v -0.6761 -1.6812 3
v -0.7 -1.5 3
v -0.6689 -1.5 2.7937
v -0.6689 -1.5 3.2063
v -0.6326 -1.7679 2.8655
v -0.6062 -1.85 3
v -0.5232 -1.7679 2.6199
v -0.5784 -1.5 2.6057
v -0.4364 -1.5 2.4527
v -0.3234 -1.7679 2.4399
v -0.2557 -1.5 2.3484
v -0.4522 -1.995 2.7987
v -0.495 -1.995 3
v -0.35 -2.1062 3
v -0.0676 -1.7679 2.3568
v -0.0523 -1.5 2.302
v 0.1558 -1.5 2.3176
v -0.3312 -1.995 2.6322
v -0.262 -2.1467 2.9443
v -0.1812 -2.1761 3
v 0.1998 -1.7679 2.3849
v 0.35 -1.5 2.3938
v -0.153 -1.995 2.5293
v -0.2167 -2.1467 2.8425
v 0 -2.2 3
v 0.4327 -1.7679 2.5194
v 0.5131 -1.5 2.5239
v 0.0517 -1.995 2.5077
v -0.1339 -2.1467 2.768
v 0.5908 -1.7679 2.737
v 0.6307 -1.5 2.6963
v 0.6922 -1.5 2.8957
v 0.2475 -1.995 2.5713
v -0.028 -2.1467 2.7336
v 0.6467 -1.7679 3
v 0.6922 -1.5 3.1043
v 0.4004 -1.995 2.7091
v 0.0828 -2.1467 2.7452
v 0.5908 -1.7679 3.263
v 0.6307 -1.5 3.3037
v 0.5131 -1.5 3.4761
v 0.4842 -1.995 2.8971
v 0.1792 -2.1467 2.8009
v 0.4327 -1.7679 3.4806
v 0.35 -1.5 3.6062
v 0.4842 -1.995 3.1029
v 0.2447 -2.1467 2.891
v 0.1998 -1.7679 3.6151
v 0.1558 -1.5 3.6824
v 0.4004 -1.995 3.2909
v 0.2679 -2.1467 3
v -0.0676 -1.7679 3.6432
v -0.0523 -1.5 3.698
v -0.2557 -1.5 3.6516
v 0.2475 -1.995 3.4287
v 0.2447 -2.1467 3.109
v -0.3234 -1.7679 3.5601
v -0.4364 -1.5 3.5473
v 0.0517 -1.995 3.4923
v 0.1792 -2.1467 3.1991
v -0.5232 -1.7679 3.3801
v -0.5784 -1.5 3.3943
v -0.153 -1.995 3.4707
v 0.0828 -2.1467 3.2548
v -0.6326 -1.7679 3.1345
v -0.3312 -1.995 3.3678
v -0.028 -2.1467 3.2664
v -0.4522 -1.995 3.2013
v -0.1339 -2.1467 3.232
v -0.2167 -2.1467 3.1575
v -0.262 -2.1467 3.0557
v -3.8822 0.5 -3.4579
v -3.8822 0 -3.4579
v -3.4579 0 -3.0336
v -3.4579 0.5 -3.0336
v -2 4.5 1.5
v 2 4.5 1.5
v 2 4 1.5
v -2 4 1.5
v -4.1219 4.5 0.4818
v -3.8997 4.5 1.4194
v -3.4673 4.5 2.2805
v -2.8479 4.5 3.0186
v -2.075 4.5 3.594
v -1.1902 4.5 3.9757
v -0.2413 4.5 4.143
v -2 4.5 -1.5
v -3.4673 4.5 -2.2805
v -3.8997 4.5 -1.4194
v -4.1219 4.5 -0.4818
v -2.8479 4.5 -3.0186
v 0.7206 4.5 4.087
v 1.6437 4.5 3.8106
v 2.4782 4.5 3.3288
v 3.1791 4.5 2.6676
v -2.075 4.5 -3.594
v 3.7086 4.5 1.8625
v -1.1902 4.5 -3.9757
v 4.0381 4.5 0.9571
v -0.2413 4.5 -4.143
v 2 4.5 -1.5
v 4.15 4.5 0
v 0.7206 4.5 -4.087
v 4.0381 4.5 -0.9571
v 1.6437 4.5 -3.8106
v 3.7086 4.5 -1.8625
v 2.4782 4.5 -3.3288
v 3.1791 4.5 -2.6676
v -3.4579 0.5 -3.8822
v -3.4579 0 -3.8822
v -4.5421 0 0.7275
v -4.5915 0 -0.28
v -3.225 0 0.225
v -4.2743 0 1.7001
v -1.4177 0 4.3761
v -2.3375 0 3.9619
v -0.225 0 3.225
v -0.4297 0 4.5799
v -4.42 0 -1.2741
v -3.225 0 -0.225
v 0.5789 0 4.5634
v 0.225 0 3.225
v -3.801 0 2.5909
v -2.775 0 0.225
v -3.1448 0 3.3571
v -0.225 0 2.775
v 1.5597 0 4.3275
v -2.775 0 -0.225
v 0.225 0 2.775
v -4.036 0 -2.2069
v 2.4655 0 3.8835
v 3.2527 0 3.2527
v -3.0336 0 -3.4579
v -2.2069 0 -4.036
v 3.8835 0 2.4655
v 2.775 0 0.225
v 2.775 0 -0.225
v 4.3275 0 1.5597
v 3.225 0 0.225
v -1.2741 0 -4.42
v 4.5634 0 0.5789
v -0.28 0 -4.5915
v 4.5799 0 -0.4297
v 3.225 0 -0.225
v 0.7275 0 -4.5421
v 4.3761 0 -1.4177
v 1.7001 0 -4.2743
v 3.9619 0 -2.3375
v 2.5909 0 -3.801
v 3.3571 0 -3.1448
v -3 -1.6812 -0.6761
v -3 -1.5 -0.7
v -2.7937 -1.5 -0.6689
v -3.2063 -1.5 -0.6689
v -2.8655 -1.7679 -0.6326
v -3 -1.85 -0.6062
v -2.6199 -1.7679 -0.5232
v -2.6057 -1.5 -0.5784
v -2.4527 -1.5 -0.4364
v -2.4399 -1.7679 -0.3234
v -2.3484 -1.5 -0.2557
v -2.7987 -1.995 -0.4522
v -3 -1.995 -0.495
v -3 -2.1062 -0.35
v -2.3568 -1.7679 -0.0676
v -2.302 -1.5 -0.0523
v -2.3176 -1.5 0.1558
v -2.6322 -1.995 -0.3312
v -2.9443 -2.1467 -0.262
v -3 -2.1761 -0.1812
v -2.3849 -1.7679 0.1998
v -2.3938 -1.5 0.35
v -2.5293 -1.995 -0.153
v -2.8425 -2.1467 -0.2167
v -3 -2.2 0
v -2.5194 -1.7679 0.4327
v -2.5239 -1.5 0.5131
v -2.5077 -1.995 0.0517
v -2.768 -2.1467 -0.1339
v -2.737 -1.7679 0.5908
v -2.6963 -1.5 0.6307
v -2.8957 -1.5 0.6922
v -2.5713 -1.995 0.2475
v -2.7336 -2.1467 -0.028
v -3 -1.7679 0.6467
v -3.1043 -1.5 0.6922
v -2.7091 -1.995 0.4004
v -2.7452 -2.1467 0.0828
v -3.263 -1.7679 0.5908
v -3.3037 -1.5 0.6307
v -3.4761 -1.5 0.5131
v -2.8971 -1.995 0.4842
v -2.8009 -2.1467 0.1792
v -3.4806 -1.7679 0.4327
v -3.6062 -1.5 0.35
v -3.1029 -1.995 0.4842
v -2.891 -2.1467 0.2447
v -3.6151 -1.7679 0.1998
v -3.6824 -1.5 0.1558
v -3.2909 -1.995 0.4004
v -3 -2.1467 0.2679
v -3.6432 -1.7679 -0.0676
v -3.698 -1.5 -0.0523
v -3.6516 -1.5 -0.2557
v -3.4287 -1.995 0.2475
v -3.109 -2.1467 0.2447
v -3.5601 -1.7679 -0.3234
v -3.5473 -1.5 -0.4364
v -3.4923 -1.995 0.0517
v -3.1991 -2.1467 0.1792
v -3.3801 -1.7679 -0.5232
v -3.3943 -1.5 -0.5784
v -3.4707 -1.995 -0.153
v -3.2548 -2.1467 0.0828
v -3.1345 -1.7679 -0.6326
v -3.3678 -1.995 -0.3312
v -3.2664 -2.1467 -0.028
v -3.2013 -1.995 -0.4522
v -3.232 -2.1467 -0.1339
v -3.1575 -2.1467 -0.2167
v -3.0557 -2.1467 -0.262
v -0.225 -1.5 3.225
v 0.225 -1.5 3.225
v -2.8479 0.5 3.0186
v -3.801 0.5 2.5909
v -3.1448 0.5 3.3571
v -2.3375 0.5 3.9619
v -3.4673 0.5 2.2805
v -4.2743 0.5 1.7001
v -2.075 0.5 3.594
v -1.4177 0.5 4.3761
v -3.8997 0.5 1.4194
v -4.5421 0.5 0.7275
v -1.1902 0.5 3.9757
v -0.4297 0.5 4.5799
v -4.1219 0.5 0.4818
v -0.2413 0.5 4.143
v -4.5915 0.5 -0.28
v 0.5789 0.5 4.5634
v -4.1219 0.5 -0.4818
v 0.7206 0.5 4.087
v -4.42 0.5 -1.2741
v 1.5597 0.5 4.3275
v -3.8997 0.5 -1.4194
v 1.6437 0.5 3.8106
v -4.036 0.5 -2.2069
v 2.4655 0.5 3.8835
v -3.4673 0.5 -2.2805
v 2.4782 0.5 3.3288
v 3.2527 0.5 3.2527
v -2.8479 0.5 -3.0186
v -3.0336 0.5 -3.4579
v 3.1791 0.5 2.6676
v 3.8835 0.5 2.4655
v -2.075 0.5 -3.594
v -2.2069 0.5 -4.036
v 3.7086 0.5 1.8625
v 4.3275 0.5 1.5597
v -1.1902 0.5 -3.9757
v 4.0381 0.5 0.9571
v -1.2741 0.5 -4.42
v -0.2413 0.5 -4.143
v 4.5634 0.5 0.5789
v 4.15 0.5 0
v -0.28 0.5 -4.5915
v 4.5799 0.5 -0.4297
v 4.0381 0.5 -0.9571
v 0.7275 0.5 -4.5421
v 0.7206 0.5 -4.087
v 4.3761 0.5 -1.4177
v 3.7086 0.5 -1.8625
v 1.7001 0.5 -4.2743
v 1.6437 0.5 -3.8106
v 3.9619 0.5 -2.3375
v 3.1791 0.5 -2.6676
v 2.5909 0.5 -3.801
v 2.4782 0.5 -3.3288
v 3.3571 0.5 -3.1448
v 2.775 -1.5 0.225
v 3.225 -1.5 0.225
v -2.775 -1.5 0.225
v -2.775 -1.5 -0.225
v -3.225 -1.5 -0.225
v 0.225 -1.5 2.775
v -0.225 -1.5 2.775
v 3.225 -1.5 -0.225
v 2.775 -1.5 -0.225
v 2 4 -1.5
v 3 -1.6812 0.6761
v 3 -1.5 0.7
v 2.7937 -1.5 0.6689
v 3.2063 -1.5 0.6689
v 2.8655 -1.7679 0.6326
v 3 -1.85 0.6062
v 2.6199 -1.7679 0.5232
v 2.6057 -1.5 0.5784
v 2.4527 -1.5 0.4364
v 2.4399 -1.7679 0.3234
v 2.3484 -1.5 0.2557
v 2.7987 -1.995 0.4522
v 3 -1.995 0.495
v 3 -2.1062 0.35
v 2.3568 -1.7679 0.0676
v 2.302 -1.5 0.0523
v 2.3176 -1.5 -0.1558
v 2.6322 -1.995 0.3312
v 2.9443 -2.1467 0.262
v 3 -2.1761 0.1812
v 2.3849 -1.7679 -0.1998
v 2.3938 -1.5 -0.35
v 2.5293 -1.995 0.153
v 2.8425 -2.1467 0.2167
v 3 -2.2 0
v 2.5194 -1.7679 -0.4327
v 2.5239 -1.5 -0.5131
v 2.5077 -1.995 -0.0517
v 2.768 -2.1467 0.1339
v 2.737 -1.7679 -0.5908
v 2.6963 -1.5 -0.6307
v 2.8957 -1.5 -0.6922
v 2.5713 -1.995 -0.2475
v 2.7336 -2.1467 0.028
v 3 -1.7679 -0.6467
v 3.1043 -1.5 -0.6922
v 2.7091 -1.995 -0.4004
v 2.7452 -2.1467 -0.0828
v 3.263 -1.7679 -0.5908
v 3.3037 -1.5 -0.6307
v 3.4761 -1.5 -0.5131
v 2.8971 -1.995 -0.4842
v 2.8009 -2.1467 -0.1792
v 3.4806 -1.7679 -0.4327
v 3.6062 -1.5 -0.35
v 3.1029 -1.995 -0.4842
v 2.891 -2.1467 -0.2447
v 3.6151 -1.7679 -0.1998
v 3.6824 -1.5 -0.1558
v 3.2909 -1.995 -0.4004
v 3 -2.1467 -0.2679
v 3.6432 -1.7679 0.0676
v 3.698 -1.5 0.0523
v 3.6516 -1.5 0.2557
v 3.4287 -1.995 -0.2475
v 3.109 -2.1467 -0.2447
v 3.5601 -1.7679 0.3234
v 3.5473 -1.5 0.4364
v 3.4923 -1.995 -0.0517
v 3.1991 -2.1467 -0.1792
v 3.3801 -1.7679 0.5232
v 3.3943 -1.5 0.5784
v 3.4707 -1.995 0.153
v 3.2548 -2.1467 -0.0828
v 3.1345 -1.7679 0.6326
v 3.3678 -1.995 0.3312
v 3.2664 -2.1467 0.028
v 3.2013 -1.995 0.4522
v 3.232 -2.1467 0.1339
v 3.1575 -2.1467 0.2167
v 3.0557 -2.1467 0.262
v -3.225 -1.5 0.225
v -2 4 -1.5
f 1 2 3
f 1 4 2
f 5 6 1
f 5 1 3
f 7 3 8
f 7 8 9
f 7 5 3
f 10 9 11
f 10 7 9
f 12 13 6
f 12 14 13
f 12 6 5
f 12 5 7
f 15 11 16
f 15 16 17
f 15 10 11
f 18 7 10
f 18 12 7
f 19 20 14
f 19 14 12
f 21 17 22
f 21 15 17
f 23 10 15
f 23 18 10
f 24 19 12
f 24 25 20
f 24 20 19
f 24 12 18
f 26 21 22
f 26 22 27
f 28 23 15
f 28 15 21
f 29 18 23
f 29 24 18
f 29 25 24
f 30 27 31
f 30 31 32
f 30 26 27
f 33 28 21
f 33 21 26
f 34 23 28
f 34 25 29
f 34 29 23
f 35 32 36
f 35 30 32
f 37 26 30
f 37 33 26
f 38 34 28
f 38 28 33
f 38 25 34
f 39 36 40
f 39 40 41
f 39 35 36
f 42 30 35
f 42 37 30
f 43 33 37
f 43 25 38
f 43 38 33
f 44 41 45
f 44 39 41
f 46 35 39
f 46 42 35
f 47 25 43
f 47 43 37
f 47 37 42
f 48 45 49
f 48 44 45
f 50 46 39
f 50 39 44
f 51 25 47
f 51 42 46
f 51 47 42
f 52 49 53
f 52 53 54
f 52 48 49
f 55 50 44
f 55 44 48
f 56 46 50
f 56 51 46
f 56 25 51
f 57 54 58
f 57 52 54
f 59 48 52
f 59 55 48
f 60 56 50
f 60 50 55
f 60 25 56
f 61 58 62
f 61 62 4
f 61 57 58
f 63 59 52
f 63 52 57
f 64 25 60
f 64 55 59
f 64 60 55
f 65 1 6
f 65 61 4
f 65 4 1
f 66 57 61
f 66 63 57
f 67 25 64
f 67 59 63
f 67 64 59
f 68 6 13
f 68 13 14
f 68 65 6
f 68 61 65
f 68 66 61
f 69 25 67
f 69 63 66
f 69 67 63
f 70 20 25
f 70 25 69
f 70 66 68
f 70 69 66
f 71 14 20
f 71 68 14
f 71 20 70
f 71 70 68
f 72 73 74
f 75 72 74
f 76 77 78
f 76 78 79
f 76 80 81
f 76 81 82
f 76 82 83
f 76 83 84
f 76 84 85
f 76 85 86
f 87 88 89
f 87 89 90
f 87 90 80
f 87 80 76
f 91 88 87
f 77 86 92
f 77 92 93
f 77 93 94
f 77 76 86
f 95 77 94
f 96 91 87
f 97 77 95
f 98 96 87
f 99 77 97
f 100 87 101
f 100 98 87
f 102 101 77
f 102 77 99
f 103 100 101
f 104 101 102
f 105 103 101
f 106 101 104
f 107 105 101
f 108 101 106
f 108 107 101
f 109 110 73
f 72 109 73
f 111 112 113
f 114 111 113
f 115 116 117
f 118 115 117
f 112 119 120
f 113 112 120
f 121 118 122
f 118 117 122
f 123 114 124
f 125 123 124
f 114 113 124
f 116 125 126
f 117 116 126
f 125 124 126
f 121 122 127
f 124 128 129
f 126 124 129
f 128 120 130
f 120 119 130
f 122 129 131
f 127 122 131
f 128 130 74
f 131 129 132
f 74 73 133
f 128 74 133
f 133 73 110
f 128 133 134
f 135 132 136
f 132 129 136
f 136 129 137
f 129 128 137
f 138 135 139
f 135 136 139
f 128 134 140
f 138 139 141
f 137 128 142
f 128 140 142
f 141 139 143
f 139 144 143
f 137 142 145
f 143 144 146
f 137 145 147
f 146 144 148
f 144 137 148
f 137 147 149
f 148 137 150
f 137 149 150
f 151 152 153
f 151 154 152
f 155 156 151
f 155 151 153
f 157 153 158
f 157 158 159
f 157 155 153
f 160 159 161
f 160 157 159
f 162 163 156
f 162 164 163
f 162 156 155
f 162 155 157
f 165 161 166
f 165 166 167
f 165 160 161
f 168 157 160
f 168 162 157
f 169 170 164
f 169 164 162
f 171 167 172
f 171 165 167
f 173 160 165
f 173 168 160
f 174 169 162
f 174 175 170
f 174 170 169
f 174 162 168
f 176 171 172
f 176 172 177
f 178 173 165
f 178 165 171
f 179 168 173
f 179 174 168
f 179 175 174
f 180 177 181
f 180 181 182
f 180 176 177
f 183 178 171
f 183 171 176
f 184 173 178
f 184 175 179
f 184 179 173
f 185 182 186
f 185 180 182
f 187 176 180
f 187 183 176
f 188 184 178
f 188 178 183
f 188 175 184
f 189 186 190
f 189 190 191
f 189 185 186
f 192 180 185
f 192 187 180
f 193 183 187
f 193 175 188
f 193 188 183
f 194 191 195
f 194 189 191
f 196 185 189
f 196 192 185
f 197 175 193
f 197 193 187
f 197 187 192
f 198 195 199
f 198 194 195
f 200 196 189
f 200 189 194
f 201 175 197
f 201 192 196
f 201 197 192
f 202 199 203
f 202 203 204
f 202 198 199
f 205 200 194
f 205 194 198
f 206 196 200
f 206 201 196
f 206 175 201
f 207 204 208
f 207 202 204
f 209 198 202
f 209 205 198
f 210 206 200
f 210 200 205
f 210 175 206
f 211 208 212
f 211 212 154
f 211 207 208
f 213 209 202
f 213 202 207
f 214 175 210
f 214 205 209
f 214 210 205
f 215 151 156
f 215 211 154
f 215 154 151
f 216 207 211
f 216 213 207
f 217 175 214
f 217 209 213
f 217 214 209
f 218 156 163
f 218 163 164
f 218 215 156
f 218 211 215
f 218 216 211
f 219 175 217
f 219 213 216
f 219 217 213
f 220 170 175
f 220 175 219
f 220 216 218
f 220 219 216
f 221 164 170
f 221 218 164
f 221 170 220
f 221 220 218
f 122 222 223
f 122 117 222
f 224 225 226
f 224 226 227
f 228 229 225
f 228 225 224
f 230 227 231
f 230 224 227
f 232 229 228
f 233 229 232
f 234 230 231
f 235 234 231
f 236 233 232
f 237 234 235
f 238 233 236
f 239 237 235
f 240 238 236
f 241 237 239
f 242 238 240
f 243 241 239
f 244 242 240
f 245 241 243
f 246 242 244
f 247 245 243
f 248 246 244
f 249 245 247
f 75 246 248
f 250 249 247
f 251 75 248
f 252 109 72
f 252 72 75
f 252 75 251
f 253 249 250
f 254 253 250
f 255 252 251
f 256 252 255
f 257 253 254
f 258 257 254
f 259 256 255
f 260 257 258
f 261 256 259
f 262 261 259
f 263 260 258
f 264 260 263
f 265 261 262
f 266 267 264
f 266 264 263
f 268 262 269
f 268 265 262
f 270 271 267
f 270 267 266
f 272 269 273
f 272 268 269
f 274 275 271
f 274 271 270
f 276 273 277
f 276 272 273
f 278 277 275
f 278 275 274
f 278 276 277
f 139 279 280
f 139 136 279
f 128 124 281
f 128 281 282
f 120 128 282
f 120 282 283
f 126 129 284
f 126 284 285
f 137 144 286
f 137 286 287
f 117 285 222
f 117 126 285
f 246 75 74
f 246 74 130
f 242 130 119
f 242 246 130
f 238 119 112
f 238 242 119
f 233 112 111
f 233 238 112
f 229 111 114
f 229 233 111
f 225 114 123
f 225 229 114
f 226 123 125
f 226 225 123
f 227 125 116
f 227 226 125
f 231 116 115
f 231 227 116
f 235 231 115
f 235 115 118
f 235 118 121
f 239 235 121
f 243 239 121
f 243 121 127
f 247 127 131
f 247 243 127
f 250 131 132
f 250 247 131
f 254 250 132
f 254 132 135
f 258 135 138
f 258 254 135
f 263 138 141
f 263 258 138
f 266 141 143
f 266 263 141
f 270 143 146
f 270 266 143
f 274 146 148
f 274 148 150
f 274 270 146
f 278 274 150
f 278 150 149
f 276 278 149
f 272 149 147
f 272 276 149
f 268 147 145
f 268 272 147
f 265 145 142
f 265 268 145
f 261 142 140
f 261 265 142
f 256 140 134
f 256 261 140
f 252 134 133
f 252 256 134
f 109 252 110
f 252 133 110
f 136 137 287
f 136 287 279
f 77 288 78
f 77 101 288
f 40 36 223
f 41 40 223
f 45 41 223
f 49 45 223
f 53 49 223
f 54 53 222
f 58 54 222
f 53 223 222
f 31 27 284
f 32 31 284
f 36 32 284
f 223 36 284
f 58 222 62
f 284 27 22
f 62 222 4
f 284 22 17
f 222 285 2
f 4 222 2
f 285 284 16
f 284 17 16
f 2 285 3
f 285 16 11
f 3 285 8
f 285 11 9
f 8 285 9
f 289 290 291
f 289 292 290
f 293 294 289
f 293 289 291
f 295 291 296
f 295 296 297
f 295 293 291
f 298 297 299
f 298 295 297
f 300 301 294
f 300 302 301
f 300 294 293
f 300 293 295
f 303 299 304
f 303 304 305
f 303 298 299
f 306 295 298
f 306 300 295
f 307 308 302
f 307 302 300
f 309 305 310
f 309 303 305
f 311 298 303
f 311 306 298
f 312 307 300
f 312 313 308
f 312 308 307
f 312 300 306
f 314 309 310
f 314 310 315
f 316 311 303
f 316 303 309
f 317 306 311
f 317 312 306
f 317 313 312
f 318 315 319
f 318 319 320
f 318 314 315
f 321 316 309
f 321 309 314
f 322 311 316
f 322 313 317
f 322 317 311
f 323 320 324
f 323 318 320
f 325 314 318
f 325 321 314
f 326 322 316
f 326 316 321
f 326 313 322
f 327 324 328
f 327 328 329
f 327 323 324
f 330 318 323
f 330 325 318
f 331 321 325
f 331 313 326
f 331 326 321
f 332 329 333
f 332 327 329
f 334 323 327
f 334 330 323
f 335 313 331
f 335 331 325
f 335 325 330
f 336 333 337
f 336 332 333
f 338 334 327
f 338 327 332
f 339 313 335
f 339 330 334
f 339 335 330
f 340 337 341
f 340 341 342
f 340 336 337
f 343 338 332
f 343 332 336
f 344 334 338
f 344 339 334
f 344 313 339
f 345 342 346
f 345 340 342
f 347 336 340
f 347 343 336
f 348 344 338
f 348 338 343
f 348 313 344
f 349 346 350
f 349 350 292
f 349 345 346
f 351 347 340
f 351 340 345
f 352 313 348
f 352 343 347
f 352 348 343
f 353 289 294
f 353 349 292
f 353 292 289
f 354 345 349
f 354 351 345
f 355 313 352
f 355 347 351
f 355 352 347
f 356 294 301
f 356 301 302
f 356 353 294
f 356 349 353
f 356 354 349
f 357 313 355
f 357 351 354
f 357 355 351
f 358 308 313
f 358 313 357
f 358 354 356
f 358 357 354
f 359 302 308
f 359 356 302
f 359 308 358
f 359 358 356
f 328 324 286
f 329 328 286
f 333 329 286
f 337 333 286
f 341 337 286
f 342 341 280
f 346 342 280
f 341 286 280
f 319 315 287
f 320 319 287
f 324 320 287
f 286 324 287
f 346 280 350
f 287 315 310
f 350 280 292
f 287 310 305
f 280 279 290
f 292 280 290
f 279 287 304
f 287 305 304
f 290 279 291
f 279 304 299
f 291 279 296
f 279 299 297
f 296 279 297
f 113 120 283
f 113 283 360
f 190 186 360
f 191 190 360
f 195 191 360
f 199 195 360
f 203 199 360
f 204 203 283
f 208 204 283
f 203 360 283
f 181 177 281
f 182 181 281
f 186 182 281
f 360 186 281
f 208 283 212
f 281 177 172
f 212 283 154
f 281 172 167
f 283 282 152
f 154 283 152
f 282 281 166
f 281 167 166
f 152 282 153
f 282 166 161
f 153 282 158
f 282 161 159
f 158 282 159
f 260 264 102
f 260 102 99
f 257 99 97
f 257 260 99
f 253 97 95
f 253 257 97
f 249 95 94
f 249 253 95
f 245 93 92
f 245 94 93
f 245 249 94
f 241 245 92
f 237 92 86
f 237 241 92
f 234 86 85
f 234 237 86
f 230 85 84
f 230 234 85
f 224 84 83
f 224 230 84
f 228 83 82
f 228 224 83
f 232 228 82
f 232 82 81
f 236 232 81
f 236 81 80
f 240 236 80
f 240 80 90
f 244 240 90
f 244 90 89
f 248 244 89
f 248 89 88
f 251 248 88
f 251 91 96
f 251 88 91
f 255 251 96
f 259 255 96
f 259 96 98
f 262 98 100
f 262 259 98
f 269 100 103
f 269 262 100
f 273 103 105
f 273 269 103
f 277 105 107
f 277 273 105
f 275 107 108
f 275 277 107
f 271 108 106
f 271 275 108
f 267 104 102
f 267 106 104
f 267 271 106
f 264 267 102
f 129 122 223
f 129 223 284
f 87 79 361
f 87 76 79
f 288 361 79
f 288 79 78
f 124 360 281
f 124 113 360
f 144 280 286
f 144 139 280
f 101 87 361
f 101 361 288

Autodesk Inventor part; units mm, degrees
ref_plane "YZ Plane" through (0, 0, 0) normal (1, 0, 0) x (0, 1, 0)
ref_plane "XZ Plane" through (0, 0, 0) normal (0, 1, 0) x (-1, 0, 0)
sketch "Sketch1" plane through (0, 0, 0) normal (0, 0, 1) x (1, 0, 0)
  line L0 (0, 4.5) -> (4.15, 4.5)
  line L1 (4.15, 4.5) -> (4.15, 0.5)
  line L2 (4.6, 0) -> (0, 0)
  line L3 (0, 0) -> (0, 4.5)
  line L4 (4.6, 0) -> (4.6, 0.5)
  line L5 (4.6, 0.5) -> (4.15, 0.5)
  dimension "d0" = 4.15
  dimension "d2" = 0.5
  dimension "d3" = 4.6
  dimension "d5" = 4.5
revolve "Revolution1" add sketch "Sketch1" angle 360 about axis through (0, 0, 0) along (0, 1, 0)
sketch "Sketch2" plane through (0, 4.5, 0) normal (0, 1, 0) x (1, 0, 0)
  line L0 (-2, 1.5) -> (2, 1.5)
  line L1 (2, 1.5) -> (2, -1.5)
  line L2 (2, -1.5) -> (-2, -1.5)
  line L3 (-2, -1.5) -> (-2, 1.5)
  line L4 (-2, 1.5) -> (2, -1.5) construction
  line L5 (2, 1.5) -> (-2, -1.5) construction
  point P0 (0, 0)
  dimension "d7" = 4
  dimension "d8" = 3
extrude "Extrusion1" cut sketch "Sketch2" against normal blind 0.5
sketch "Sketch3" plane through (0, 0, 0) normal (0, -1, 0) x (1, 0, 0)
  line L0 (-0.225, 0.225) -> (0.225, 0.225)
  line L1 (0.225, 0.225) -> (0.225, -0.225)
  line L2 (0.225, -0.225) -> (-0.225, -0.225)
  line L3 (-0.225, -0.225) -> (-0.225, 0.225)
  line L4 (-0.225, 0.225) -> (0.225, -0.225) construction
  line L5 (0.225, 0.225) -> (-0.225, -0.225) construction
  line L6 (2.775, 0.225) -> (3.225, 0.225)
  line L7 (3.225, 0.225) -> (3.225, -0.225)
  line L8 (3.225, -0.225) -> (2.775, -0.225)
  line L9 (2.775, -0.225) -> (2.775, 0.225)
  line L10 (2.775, 0.225) -> (3.225, -0.225) construction
  line L11 (3.225, 0.225) -> (2.775, -0.225) construction
  line L12 (-3.225, 0.225) -> (-2.775, 0.225)
  line L13 (-2.775, 0.225) -> (-2.775, -0.225)
  line L14 (-2.775, -0.225) -> (-3.225, -0.225)
  line L15 (-3.225, -0.225) -> (-3.225, 0.225)
  line L16 (-3.225, 0.225) -> (-2.775, -0.225) construction
  line L17 (-2.775, 0.225) -> (-3.225, -0.225) construction
  line L18 (-0.225, 0.225) -> (0.225, 0.225)
  line L19 (0.225, 0.225) -> (0.225, -0.225)
  line L20 (0.225, -0.225) -> (-0.225, -0.225)
  line L21 (-0.225, -0.225) -> (-0.225, 0.225)
  line L22 (-0.225, 0.225) -> (0.225, -0.225) construction
  line L23 (0.225, 0.225) -> (-0.225, -0.225) construction
  line L24 (-0.225, 3.225) -> (0.225, 3.225)
  line L25 (0.225, 3.225) -> (0.225, 2.775)
  line L26 (0.225, 2.775) -> (-0.225, 2.775)
  line L27 (-0.225, 2.775) -> (-0.225, 3.225)
  line L28 (-0.225, 3.225) -> (0.225, 2.775) construction
  line L29 (0.225, 3.225) -> (-0.225, 2.775) construction
  point P0 (0, 0)
  point P1 (3, 0)
  point P2 (-3, 0)
  point P3 (0, 0)
  point P4 (0, 3)
  point P5 (0, 0)
  point P6 (0, 0)
  dimension "d11" = 0.45
  dimension "d12" = 0.45
  dimension "d15" = 3
  dimension "d18" = 3
  dimension "d26" = 0.45
  dimension "d27" = 0.45
  dimension "d28" = 3
extrude "Extrusion2" add sketch "Sketch3" along normal blind 2 contours L6 L7 L8 L9 | L12 L13 L14 L15 | L24 L25 L26 L27
sketch "Sketch4" plane through (0, 0, 0) normal (0, -1, 0) x (1, 0, 0)
  line L0 (0, 0) -> (-4.5837, -4.5837)
  line L1 (0, 0) -> (-2.6627, 0)
  circle A0 centre (0, 0) radius 4.6 projected
  line L2 (-3.0336, -3.4579) -> (-3.4579, -3.8822)
  line L3 (-3.4579, -3.8822) -> (-3.8822, -3.4579)
  line L4 (-3.8822, -3.4579) -> (-3.4579, -3.0336)
  point P0 (-3.67, -3.67)
  dimension "d29" = 45
  dimension "d30" = 0.6
  dimension "d31" = 0.6
extrude "Extrusion3" add sketch "Sketch4" against normal up to surface (0.5 mm away) contours A0 L2 L3 L0 | L0 L3 L4 A0
ref_plane "Work Plane1" through (-3, 0, -0.225) normal (-1, 0, 0) x (0, 0, 1)
sketch "Sketch6" plane through (-3, 0, -0.225) normal (-1, 0, 0) x (0, 0, 1)
  arc A0 (-0.475, -1.5) -> (0.225, -2.2) centre (0.225, -1.5) ccw
  line L0 (0, -2) -> (0.45, -2) projected
  line L1 (-0.475, -1.5) -> (0.225, -1.5)
  line L2 (0.225, -1.5) -> (0.225, -2.2)
  point P0 (0.225, 0)
  point P1 (0.225, -2)
  dimension "d36" = 0.5
  dimension "d37" = 0.7
revolve "Revolution2" add sketch "Sketch6" angle 360 about axis through (-3, -1.5, 0) along (0, -1, 0)
pattern_circular "Circular Pattern1" count 3 over 180 about axis through (0, 2.5, 0) along (0, 1, 0) of "Revolution2"
properties part number "PIR sensor RE200B"
